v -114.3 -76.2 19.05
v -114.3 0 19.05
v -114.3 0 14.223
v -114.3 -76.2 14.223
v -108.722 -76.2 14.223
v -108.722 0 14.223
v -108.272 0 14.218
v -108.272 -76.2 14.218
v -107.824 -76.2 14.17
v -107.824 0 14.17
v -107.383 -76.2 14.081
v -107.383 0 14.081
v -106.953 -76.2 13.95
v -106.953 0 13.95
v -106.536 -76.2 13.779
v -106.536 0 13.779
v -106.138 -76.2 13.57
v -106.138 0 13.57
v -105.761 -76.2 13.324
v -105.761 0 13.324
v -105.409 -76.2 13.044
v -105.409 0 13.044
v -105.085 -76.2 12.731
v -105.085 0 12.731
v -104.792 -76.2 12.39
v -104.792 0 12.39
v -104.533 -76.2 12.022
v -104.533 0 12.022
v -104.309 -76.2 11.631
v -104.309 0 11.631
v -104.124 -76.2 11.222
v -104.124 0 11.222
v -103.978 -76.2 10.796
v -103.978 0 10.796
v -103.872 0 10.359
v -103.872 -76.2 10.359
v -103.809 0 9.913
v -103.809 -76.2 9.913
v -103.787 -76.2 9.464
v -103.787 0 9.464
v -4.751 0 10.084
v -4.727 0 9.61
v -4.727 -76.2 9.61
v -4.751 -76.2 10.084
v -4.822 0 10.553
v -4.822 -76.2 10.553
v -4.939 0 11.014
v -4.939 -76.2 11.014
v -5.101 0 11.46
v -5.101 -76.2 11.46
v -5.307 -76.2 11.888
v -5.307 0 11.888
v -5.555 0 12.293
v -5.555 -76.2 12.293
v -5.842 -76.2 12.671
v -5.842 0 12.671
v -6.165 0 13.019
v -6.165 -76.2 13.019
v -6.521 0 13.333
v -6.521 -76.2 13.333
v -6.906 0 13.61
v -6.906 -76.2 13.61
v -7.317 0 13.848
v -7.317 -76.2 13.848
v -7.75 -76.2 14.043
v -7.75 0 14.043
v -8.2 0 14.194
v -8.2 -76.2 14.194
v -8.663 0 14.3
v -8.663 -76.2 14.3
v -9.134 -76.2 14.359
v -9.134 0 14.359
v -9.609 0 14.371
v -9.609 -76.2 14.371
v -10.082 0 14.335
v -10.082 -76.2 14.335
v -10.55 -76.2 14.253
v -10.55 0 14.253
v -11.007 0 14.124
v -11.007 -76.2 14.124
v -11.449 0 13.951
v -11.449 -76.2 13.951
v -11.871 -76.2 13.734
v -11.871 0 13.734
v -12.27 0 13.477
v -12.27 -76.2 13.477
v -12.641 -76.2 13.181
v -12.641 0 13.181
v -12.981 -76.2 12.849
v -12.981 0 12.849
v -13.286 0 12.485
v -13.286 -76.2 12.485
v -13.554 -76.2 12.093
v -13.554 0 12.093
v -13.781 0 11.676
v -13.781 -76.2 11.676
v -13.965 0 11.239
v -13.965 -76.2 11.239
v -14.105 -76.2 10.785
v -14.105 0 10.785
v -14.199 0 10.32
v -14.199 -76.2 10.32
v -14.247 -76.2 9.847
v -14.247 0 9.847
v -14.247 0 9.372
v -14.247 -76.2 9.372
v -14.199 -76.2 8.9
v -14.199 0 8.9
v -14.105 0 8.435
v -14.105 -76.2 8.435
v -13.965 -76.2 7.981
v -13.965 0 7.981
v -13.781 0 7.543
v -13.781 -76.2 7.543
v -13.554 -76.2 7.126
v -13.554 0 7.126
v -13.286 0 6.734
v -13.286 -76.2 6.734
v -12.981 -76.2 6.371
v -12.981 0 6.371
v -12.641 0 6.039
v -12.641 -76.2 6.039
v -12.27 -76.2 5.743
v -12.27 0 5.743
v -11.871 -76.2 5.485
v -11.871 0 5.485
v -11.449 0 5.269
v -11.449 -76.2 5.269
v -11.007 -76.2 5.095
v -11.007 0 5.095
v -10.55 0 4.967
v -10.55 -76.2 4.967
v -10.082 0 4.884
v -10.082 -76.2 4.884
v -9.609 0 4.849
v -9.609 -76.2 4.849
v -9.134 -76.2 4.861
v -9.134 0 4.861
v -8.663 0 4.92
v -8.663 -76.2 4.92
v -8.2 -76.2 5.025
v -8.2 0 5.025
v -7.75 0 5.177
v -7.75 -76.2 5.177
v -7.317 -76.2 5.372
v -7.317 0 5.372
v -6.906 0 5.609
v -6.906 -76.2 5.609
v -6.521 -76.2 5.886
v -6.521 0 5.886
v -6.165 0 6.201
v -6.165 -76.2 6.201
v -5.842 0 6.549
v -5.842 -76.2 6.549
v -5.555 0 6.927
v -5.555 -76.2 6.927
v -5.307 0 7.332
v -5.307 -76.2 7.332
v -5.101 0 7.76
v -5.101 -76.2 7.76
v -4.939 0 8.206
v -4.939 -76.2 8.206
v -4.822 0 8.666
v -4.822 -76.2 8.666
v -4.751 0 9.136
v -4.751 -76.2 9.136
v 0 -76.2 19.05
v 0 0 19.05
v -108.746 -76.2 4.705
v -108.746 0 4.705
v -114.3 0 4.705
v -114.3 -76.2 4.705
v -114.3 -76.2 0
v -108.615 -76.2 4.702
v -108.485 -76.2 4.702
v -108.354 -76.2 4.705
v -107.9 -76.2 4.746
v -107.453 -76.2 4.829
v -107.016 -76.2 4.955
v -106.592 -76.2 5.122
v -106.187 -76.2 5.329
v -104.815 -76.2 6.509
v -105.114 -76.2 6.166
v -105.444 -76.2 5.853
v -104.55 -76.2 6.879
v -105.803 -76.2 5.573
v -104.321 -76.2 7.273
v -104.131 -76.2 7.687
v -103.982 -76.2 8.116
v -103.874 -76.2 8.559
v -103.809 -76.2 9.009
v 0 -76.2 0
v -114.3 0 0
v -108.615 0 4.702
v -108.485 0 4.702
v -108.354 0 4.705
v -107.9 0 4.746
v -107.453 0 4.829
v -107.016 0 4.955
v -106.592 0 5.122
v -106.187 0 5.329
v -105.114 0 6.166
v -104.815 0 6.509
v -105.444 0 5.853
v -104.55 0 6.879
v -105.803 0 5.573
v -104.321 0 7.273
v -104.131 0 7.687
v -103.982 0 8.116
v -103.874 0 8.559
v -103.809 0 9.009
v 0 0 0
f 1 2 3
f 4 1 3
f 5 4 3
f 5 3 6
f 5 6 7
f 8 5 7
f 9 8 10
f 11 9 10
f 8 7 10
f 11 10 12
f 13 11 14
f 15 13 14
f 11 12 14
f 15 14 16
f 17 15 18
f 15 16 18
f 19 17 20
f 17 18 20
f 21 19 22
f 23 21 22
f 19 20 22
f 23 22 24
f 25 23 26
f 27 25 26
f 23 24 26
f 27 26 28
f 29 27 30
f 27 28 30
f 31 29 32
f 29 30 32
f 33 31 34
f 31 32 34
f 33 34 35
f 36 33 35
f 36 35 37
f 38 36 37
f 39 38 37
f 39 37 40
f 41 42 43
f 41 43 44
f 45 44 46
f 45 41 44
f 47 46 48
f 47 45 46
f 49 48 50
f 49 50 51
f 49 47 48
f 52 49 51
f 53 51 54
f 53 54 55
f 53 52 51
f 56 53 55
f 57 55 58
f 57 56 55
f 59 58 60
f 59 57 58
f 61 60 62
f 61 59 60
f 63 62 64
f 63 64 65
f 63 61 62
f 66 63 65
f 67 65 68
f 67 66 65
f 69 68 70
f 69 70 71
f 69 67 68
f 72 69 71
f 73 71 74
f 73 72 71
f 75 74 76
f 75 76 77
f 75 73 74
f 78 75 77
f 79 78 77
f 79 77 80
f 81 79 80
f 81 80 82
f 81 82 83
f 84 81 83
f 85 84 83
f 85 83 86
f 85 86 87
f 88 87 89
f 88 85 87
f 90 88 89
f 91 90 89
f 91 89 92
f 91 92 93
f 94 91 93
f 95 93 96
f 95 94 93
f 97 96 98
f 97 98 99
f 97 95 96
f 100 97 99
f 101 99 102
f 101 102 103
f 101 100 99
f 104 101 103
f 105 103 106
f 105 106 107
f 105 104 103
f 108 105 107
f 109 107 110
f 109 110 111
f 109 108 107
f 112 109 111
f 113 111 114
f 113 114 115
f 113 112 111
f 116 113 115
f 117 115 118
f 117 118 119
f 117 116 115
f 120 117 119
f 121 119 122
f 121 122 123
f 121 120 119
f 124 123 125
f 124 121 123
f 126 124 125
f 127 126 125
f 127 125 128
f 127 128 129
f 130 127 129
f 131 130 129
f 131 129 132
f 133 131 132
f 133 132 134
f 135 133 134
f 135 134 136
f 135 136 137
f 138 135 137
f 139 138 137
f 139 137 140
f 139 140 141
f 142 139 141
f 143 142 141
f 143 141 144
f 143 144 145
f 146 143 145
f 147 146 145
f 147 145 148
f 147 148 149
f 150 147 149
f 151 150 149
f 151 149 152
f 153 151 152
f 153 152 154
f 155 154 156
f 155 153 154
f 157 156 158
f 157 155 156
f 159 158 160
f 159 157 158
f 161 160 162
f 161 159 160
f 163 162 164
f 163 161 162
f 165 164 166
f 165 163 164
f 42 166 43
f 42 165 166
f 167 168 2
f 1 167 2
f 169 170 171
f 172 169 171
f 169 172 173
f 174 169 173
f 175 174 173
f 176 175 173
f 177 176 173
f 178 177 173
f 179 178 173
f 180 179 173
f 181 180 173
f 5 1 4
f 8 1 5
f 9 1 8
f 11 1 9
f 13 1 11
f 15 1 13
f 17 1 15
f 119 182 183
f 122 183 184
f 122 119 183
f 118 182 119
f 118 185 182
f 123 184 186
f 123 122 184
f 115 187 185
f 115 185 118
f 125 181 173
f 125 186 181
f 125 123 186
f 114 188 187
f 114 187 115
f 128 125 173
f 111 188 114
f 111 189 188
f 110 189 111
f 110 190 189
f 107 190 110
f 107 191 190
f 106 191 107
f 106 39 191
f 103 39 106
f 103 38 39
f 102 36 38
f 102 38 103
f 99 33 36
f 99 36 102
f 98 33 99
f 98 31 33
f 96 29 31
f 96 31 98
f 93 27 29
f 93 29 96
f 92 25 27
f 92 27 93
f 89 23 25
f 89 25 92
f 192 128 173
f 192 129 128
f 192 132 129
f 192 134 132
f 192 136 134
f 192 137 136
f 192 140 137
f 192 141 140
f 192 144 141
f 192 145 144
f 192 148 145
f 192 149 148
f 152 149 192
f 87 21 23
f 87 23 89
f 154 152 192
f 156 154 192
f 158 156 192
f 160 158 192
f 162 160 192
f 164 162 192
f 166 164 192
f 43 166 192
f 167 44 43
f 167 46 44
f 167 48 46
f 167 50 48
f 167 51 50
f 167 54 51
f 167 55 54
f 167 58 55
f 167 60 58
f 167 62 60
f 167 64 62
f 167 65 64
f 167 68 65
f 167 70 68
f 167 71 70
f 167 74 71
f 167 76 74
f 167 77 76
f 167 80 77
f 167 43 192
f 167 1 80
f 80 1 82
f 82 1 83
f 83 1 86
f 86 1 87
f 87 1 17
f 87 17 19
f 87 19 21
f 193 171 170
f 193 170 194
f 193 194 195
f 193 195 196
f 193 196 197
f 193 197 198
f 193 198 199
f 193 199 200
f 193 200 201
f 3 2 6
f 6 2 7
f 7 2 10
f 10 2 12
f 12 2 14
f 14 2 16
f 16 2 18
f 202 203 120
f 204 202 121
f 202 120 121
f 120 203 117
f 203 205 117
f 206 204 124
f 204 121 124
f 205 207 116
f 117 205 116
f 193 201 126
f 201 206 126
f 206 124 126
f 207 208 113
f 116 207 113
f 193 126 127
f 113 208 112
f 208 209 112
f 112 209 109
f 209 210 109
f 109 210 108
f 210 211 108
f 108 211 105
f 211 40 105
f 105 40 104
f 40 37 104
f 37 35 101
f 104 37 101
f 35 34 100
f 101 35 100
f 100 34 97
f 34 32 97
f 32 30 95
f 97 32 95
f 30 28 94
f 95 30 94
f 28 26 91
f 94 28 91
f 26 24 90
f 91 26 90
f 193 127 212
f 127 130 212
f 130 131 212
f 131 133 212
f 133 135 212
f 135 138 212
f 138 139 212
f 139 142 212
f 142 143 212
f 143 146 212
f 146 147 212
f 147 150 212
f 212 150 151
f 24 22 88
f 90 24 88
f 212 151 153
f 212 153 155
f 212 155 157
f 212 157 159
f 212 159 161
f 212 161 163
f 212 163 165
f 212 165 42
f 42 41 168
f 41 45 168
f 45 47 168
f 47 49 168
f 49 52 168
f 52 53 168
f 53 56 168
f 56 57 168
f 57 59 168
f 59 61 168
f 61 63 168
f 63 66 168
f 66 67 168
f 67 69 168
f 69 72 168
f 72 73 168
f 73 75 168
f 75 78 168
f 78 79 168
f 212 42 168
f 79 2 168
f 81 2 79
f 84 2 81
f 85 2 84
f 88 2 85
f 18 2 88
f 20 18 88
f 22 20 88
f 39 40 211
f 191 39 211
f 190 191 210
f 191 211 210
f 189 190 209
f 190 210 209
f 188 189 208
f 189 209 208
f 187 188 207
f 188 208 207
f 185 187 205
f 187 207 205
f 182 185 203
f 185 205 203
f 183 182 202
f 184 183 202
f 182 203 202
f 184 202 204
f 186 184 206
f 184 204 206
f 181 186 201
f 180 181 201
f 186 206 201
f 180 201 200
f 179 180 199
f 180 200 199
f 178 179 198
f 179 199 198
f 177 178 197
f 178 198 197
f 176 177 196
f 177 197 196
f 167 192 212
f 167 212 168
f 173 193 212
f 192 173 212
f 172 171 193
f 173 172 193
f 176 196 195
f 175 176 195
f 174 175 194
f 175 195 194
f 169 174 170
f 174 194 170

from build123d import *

# Parameters (mm, degrees)
F0_R     = 4.7625
F1_DEPTH = 76.2


# Not quite as in the source:
# - the program builds the solid bodies; features that only make, move or delete a surface that nothing else refers to are left out


with BuildPart() as f1:
    # F0 (on Front) → F1 (new body)
    with BuildSketch(Plane.XZ):
        with BuildLine():
            Line((-114.3, 0), (0, 0))
            Line((0, 0), (0, 19.05))
            Line((0, 19.05), (-114.3, 19.05))
            Line((-114.3, 19.05), (-114.3, 14.2229856587))
            Line((-114.3, 14.2229856587), (-108.7215644084, 14.2229856587))
            ThreePointArc((-108.7215644084, 14.2229856587), (-105.2435953967, 12.891306681), (-103.7874654915, 9.4635781261))
            ThreePointArc((-103.7874654915, 9.4635781261), (-105.1136603504, 6.1661225575), (-108.3536442745, 4.7051262529))
            ThreePointArc((-108.3536442745, 4.7051262529), (-108.5499654915, 4.7010781261), (-108.7462867086, 4.7051262529))
            Line((-108.7462867086, 4.7051262529), (-114.3, 4.7051262529))
            Line((-114.3, 4.7051262529), (-114.3, 0))
        make_face()
        with Locations((-9.4899654915, 9.609828106)):
            Circle(F0_R, mode=Mode.SUBTRACT)
    extrude(amount=F1_DEPTH)


solid = f1.part
